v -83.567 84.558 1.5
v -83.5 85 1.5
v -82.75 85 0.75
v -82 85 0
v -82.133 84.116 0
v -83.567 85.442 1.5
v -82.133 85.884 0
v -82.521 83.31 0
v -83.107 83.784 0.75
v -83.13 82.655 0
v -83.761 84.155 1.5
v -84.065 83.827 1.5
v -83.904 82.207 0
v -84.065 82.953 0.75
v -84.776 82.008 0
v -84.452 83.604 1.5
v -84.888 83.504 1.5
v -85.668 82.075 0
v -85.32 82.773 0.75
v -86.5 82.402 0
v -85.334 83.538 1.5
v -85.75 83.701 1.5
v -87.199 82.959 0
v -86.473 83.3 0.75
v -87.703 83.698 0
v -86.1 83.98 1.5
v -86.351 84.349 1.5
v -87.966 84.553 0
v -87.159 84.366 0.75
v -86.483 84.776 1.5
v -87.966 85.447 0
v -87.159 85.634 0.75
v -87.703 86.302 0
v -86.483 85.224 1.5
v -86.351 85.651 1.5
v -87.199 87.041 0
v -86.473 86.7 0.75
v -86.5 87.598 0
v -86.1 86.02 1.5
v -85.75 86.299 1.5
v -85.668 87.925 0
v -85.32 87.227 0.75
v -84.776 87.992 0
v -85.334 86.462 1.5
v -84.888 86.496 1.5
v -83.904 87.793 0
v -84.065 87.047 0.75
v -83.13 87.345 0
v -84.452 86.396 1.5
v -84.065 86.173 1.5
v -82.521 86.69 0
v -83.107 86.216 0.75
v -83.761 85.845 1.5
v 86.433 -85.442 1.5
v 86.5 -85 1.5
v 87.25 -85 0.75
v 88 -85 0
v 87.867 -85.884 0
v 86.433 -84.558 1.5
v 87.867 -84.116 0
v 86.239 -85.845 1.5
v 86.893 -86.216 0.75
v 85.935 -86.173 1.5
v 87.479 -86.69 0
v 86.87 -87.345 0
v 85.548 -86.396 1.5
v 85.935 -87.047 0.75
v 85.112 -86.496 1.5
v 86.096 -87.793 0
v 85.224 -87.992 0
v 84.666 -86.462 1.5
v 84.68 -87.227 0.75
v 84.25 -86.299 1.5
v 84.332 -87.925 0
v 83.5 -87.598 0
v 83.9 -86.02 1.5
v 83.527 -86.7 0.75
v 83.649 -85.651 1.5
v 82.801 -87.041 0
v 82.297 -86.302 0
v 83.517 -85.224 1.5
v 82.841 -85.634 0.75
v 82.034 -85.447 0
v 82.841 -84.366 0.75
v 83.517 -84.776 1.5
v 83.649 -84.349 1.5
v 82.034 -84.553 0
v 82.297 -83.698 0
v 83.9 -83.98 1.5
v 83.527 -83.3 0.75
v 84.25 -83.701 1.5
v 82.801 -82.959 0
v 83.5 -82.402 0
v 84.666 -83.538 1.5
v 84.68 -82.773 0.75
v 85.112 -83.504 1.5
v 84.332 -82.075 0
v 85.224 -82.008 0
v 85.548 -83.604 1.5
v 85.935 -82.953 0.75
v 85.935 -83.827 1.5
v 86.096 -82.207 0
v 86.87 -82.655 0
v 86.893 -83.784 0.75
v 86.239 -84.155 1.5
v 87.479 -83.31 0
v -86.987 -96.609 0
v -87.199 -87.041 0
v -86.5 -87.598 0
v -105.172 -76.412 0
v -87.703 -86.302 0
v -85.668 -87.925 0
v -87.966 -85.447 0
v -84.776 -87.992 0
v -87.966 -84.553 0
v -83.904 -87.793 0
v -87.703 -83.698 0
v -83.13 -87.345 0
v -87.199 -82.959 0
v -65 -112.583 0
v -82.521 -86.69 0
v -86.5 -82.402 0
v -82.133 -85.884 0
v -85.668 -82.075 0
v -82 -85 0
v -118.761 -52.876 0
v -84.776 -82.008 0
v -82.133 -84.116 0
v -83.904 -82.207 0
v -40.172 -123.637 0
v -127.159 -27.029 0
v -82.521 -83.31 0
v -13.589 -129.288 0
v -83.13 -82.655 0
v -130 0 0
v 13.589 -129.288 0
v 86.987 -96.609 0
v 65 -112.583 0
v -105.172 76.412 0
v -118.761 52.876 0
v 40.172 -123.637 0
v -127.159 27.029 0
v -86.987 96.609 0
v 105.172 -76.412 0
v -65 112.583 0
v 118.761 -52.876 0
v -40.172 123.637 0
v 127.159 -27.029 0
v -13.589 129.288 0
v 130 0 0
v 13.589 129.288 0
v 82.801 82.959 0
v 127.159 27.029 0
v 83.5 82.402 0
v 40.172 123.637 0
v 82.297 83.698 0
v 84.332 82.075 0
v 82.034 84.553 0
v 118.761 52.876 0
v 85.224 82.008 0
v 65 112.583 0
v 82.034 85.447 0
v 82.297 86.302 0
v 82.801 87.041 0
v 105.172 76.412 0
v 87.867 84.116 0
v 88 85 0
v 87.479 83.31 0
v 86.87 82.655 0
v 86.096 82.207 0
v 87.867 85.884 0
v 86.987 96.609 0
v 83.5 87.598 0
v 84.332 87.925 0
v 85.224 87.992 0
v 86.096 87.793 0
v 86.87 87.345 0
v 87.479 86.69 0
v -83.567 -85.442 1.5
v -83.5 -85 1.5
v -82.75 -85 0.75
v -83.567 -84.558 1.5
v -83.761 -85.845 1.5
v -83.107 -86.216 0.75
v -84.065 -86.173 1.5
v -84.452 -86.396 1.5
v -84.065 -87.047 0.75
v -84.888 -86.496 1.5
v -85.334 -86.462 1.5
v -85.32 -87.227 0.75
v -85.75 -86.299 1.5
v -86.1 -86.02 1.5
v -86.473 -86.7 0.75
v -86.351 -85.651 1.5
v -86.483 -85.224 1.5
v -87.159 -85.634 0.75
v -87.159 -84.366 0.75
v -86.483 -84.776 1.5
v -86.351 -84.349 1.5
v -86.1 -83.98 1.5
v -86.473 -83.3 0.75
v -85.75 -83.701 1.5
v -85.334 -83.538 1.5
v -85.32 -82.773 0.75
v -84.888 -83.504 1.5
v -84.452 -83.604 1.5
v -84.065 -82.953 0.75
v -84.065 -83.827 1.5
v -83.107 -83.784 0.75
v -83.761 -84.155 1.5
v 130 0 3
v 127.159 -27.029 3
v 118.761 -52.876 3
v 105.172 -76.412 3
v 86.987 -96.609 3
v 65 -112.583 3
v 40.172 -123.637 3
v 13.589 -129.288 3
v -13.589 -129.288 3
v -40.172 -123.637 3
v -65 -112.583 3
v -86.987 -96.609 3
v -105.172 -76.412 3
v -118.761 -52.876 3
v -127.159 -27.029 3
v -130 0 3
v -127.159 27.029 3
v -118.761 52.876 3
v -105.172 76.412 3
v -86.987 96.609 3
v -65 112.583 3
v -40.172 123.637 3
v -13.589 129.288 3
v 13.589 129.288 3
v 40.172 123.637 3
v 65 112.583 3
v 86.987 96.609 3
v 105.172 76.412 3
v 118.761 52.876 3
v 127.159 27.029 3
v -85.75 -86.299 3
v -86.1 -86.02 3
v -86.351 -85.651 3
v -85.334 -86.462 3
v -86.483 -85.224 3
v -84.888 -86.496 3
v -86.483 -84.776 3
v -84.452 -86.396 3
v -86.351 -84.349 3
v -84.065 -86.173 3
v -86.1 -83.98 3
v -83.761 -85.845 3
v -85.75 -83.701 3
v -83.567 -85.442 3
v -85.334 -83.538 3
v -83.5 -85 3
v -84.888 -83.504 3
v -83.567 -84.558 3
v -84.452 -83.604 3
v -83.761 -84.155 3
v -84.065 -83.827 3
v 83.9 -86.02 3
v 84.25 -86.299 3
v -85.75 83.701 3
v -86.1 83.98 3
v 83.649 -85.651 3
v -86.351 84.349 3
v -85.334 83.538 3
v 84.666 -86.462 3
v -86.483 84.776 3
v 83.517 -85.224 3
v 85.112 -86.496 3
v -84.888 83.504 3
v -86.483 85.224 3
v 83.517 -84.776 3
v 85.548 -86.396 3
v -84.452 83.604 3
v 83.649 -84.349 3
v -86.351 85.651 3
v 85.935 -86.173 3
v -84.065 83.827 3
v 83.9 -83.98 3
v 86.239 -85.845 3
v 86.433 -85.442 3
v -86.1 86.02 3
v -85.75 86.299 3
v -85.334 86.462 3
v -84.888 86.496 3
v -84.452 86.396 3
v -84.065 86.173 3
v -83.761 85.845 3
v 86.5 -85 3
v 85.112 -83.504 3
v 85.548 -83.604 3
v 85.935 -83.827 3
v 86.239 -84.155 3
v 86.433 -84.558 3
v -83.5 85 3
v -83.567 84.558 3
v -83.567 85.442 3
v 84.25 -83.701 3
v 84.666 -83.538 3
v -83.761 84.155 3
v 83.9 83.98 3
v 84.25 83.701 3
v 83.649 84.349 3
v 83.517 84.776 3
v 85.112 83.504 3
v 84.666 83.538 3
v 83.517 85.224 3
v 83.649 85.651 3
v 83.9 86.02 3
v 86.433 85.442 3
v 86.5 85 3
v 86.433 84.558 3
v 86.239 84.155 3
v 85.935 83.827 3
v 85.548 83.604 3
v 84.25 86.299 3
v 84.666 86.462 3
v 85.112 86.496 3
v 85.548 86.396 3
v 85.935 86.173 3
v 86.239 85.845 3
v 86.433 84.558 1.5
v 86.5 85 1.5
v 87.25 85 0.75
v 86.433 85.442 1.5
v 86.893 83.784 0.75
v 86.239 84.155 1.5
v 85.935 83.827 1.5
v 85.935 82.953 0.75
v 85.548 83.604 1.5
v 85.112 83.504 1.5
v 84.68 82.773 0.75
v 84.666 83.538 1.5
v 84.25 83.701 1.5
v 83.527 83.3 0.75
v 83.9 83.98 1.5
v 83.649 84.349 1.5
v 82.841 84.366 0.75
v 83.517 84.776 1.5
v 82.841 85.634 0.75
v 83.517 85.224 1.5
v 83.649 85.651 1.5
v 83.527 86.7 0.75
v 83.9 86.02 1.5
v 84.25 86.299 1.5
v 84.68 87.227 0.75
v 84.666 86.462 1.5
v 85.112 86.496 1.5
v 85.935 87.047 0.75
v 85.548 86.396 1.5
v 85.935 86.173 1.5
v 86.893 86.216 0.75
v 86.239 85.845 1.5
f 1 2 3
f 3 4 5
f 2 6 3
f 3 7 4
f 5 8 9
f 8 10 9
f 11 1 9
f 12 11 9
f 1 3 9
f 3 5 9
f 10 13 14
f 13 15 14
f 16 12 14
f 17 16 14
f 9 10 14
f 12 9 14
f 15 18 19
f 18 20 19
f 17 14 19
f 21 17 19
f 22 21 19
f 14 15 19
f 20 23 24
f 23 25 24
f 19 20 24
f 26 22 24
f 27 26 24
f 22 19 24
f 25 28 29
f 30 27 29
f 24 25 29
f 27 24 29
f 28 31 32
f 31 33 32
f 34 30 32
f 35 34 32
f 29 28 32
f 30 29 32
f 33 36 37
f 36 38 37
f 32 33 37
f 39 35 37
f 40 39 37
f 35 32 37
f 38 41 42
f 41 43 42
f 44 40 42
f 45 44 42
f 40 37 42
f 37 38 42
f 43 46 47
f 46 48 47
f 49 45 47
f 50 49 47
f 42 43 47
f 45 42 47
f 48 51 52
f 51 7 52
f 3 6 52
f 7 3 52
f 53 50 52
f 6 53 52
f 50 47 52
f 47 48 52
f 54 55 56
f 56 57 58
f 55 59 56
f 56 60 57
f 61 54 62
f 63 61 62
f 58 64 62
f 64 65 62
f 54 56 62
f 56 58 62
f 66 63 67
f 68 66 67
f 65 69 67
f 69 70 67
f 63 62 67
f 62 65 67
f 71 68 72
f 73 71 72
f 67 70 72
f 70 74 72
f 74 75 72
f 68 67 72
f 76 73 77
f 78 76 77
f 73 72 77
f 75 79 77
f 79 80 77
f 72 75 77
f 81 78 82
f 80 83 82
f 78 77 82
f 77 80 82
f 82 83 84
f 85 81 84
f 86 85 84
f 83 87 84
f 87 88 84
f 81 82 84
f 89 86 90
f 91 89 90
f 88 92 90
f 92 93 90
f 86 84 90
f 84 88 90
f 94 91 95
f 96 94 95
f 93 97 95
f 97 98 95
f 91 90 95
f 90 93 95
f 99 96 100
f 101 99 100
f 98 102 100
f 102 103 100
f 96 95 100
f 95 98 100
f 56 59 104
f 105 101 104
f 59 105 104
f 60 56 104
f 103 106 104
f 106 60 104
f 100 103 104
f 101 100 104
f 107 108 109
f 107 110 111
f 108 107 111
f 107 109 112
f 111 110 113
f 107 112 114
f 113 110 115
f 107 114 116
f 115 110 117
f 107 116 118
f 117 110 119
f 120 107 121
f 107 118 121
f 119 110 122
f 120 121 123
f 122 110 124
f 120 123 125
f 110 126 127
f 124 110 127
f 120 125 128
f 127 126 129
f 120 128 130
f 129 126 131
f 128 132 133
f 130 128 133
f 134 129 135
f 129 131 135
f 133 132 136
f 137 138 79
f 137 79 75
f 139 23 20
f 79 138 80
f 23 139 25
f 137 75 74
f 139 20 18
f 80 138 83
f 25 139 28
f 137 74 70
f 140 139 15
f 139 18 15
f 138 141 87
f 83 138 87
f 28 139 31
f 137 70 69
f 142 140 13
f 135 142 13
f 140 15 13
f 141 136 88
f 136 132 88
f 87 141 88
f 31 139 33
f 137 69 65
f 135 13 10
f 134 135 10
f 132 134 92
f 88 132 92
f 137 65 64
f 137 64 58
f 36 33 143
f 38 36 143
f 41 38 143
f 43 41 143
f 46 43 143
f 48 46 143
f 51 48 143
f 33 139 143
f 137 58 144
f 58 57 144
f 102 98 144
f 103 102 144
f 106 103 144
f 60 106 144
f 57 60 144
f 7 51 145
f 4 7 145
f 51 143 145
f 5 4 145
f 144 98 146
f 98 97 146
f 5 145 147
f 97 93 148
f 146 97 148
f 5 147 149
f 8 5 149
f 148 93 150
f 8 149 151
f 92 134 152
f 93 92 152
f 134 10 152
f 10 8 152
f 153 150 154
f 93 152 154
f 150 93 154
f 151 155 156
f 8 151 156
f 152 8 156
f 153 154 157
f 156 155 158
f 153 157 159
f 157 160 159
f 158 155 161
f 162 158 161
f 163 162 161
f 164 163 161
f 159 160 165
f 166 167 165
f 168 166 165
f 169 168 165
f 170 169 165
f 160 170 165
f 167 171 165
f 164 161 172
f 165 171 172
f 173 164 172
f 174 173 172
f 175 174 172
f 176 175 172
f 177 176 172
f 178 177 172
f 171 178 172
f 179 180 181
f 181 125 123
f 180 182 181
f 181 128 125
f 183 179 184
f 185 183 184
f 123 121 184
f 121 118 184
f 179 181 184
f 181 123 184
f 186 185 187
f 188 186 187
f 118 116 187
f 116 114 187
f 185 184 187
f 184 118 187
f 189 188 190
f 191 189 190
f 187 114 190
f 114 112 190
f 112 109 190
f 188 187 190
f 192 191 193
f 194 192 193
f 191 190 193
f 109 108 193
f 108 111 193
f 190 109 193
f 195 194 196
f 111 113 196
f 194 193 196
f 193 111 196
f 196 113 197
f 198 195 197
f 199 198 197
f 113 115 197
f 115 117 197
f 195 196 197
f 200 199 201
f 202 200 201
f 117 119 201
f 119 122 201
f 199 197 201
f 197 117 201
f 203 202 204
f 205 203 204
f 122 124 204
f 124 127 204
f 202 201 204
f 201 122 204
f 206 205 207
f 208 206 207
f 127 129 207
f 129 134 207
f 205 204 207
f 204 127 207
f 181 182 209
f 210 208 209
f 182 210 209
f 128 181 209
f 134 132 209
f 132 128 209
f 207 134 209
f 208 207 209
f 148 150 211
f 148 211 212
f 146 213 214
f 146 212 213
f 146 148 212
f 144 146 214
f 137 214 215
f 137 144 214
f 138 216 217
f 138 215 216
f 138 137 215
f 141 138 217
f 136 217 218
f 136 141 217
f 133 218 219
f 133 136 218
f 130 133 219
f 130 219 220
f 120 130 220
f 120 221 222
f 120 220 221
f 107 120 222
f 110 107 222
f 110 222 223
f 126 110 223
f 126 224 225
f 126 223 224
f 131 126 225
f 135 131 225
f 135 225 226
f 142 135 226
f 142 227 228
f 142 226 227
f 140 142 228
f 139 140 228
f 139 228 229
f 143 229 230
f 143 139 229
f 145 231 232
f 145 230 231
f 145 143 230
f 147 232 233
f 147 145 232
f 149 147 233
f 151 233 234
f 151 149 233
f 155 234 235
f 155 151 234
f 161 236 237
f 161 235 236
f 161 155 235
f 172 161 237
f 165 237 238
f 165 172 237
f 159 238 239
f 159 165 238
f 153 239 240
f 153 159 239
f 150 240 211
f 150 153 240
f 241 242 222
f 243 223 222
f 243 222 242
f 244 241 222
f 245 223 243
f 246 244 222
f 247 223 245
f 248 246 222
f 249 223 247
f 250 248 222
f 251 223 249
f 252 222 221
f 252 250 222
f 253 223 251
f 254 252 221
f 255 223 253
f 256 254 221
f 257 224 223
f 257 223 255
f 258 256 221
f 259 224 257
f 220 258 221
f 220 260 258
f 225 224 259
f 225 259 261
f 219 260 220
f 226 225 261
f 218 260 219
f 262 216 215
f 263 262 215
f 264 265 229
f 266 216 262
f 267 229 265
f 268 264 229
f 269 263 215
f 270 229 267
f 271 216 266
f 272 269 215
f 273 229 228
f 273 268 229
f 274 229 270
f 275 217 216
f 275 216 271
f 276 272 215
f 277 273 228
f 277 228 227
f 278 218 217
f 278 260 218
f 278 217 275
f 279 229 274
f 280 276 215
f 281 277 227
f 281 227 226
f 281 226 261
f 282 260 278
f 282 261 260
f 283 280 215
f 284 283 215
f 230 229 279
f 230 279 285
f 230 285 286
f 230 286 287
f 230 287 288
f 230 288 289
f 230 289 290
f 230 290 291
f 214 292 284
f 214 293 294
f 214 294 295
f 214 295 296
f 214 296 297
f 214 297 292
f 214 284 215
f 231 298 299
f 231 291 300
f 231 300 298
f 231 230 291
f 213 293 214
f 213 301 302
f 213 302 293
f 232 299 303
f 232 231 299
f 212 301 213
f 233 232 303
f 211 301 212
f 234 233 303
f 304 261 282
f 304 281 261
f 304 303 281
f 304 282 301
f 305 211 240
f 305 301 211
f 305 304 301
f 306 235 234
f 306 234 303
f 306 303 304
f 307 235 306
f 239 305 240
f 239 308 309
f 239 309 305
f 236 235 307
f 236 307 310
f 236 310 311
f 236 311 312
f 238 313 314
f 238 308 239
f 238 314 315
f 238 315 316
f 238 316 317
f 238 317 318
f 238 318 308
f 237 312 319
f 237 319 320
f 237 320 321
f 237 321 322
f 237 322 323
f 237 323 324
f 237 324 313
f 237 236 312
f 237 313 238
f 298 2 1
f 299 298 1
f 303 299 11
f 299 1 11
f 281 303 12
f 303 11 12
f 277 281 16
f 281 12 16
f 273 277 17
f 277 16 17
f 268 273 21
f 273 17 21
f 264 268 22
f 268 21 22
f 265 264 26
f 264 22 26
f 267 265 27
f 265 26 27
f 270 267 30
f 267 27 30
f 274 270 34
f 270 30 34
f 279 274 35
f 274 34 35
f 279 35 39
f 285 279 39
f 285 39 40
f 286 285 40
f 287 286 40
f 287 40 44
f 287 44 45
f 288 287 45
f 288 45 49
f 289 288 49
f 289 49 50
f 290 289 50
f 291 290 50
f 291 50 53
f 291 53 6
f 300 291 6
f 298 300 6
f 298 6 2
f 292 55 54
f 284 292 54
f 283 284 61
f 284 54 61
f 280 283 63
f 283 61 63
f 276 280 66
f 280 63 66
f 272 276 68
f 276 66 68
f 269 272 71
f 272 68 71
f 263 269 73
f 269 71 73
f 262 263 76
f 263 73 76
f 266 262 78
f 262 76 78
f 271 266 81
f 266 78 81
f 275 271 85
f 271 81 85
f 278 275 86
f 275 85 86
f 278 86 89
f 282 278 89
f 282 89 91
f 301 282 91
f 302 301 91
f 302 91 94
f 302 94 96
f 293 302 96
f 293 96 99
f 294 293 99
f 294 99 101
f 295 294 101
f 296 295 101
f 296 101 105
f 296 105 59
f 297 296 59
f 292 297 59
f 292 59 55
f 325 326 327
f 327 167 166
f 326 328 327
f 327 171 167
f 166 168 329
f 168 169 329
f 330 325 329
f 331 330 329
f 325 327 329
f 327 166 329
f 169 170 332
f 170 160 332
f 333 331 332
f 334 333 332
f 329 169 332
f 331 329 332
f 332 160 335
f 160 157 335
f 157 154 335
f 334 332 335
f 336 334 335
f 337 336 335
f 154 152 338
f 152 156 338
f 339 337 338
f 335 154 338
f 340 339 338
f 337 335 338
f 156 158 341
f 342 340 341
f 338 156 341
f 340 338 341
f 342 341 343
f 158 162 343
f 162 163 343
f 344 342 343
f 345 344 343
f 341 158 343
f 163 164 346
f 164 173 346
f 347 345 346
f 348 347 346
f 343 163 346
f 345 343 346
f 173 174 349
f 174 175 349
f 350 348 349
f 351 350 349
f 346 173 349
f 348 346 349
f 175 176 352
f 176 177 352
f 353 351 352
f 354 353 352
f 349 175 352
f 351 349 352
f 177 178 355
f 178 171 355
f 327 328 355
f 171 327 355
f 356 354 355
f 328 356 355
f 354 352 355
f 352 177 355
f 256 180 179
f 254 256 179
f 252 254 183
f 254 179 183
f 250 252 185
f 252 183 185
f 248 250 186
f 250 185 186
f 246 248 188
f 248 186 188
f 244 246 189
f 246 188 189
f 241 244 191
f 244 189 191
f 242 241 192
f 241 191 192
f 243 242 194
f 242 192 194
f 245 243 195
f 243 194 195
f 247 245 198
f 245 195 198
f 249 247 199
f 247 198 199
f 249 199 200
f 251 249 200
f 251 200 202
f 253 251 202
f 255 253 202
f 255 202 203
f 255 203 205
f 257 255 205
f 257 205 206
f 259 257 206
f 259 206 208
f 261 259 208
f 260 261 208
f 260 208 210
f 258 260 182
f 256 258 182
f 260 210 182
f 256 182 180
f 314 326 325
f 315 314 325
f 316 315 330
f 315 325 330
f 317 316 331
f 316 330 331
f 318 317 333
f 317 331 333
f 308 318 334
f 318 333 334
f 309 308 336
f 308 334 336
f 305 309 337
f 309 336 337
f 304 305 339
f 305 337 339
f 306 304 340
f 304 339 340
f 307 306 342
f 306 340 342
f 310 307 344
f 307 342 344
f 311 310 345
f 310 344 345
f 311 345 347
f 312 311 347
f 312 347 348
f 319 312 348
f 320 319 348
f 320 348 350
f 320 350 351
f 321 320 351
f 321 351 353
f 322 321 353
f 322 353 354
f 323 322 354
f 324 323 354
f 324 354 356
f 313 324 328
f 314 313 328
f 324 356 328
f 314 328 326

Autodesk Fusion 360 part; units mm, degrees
sketch "Skizze1" plane through (0, 0, 0) normal (0, 0, 1) x (1, 0, 0)
  circle A0 centre (0, 0) radius 130
  dimension "d1" = 260
extrude "Extrusion1" add sketch "Skizze1" along normal blind 3
sketch "Skizze3" plane through (0, 0, 0) normal (0, 0, -1) x (1, 0, 0)
  circle A0 centre (0, 0) radius 130
  circle A1 centre (-85, 85) radius 1.5
  circle A2 centre (-85, -85) radius 1.5
  circle A3 centre (85, -85) radius 1.5
  circle A4 centre (85, 85) radius 1.5
  dimension "d4" = 3
  dimension "d5" = 85
  dimension "d6" = 85
  dimension "d8" = 360
extrude "Extrusion2" cut sketch "Skizze3" against normal blind 3 contours A1 | A2 | A3 | A4
chamfer "Fase1" distance 1.5 angle 45 4 edges at (-86.3985, -85.5424, 0) (83.6015, -85.5424, 0) (-86.3985, 84.4576, 0) (83.6015, 84.4576, 0)
